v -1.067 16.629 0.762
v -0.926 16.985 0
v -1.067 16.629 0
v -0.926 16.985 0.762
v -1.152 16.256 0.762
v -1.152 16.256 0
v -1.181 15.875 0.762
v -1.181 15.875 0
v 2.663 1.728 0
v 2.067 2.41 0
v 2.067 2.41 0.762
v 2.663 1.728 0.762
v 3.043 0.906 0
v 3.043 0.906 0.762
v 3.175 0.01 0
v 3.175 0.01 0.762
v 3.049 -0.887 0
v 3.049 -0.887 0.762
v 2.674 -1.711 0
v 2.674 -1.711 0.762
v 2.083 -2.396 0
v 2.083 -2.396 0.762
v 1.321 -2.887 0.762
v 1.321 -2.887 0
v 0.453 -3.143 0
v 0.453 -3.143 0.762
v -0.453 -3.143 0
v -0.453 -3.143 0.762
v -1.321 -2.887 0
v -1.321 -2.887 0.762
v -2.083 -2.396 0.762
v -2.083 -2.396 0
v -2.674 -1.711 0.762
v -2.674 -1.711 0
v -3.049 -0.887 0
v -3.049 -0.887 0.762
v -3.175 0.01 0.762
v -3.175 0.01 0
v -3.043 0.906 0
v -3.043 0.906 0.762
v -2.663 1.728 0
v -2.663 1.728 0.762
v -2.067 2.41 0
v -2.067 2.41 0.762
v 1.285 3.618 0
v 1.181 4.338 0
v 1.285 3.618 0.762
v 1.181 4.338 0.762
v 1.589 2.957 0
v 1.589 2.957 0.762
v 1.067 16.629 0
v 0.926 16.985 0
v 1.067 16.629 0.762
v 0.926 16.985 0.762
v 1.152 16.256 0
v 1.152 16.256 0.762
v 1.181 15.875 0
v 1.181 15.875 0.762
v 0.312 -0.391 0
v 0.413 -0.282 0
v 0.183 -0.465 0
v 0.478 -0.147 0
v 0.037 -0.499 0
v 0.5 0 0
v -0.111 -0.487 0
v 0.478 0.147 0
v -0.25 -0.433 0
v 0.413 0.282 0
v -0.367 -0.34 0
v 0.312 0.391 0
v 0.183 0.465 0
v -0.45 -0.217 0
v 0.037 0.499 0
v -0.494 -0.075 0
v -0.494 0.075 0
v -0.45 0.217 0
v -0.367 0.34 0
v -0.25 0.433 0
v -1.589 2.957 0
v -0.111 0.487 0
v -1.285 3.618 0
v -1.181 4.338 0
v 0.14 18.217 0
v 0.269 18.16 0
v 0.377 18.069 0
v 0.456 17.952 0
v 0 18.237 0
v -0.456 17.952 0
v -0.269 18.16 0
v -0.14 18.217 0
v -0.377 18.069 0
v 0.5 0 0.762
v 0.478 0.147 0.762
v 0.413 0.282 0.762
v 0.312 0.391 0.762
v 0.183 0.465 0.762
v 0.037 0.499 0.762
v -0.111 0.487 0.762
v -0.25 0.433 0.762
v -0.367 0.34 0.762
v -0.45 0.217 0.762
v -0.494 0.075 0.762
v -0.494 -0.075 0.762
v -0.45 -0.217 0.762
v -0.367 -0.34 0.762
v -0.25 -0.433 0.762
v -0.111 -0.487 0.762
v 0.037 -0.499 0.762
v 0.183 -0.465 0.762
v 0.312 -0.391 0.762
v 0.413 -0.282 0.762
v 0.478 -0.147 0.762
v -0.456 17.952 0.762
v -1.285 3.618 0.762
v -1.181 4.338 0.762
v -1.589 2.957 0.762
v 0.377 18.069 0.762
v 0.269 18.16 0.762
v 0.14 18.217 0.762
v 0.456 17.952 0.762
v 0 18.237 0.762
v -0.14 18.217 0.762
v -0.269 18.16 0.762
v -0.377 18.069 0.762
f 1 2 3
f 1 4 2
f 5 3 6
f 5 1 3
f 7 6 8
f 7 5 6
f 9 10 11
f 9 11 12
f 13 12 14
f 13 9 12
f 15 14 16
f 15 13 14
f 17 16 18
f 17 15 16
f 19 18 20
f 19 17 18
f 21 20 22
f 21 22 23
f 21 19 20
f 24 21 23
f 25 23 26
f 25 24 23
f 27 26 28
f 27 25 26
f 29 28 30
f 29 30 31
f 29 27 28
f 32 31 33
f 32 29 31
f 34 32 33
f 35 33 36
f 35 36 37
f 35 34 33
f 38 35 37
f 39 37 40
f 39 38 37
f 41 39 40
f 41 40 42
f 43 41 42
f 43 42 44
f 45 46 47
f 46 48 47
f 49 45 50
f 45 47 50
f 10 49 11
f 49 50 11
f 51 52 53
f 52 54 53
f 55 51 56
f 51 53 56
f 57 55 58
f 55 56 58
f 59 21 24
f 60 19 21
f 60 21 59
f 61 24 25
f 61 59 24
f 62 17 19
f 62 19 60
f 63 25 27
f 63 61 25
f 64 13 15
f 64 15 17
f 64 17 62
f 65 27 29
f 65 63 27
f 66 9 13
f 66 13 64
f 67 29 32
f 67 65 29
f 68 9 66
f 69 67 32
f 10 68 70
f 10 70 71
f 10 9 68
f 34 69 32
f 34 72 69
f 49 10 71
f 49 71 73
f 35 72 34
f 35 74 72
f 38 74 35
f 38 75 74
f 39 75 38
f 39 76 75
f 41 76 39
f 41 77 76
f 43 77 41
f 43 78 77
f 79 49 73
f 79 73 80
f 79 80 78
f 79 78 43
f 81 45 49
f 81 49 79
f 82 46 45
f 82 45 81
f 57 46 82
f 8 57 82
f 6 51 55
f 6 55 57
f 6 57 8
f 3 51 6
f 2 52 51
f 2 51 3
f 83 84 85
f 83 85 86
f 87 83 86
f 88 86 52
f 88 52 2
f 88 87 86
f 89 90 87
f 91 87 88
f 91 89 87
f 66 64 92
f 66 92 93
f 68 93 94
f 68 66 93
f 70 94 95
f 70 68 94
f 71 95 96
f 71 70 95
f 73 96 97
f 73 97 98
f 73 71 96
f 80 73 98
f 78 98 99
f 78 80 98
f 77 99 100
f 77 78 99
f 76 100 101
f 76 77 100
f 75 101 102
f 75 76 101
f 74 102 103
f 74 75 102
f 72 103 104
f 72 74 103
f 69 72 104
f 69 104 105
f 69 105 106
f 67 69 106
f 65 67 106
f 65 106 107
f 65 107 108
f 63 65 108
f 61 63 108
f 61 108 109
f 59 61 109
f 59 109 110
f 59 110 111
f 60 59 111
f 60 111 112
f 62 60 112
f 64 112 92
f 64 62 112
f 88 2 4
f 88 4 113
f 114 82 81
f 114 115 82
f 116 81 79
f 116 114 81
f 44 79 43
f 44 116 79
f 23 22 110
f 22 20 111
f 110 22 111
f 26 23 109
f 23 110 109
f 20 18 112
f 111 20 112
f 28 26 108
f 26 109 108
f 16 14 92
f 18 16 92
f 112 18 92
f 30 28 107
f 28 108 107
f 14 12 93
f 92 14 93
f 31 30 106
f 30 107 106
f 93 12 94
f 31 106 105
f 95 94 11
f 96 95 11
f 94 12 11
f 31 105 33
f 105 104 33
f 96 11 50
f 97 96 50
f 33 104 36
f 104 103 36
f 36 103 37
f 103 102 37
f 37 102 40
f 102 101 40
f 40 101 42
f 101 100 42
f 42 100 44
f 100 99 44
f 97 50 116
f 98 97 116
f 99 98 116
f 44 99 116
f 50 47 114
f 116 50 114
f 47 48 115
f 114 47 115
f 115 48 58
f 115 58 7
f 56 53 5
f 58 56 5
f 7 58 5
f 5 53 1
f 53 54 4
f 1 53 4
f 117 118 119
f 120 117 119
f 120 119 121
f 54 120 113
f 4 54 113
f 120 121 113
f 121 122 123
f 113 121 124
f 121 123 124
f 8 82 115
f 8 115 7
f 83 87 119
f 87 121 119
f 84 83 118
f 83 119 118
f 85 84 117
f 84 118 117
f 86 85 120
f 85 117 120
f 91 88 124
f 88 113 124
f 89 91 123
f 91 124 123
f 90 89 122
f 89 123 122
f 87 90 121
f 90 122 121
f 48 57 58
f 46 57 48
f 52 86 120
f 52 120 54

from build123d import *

# Parameters (mm, degrees)
SKETCH1_R           = 0.5
BOSS_EXTRUDE1_DEPTH = 0.762
FILLET1_R           = 2.54
FILLET2_R           = 0.507185


with BuildPart() as part:
    # Sketch1 → Boss-Extrude1 (new body)
    with BuildSketch(Plane.XY):
        with BuildLine():
            Line((-0.3175, 18.2372), (0.3175, 18.2372))
            Line((0.3175, 18.2372), (1.1811, 16.4592))
            Line((1.1811, 16.4592), (1.1811, 2.947138916))
            ThreePointArc((1.1811, 2.947138916), (0, -3.175), (-1.1811, 2.947138916))
            Line((-1.1811, 2.947138916), (-1.1811, 16.4592))
            Line((-1.1811, 16.4592), (-0.3175, 18.2372))
        make_face()
        Circle(SKETCH1_R, mode=Mode.SUBTRACT)
    extrude(amount=BOSS_EXTRUDE1_DEPTH)

    # Fillet1
    fillet1_edges = [part.edges().sort_by_distance(p)[0] for p in [
        (1.1811, 16.4592, 0.381),
        (1.1811, 2.947138916, 0.381),
        (-1.1811, 2.947138916, 0.381),
        (-1.1811, 16.4592, 0.381),
    ]]
    fillet(fillet1_edges, radius=FILLET1_R)

    # Fillet2
    fillet2_edges = [part.edges().sort_by_distance(p)[0] for p in [
        (-0.3175, 18.2372, 0.381),
        (0.3175, 18.2372, 0.381),
    ]]
    fillet(fillet2_edges, radius=FILLET2_R - 0.0001)  # a hair under: the kernel refuses the full size


solid = part.part
